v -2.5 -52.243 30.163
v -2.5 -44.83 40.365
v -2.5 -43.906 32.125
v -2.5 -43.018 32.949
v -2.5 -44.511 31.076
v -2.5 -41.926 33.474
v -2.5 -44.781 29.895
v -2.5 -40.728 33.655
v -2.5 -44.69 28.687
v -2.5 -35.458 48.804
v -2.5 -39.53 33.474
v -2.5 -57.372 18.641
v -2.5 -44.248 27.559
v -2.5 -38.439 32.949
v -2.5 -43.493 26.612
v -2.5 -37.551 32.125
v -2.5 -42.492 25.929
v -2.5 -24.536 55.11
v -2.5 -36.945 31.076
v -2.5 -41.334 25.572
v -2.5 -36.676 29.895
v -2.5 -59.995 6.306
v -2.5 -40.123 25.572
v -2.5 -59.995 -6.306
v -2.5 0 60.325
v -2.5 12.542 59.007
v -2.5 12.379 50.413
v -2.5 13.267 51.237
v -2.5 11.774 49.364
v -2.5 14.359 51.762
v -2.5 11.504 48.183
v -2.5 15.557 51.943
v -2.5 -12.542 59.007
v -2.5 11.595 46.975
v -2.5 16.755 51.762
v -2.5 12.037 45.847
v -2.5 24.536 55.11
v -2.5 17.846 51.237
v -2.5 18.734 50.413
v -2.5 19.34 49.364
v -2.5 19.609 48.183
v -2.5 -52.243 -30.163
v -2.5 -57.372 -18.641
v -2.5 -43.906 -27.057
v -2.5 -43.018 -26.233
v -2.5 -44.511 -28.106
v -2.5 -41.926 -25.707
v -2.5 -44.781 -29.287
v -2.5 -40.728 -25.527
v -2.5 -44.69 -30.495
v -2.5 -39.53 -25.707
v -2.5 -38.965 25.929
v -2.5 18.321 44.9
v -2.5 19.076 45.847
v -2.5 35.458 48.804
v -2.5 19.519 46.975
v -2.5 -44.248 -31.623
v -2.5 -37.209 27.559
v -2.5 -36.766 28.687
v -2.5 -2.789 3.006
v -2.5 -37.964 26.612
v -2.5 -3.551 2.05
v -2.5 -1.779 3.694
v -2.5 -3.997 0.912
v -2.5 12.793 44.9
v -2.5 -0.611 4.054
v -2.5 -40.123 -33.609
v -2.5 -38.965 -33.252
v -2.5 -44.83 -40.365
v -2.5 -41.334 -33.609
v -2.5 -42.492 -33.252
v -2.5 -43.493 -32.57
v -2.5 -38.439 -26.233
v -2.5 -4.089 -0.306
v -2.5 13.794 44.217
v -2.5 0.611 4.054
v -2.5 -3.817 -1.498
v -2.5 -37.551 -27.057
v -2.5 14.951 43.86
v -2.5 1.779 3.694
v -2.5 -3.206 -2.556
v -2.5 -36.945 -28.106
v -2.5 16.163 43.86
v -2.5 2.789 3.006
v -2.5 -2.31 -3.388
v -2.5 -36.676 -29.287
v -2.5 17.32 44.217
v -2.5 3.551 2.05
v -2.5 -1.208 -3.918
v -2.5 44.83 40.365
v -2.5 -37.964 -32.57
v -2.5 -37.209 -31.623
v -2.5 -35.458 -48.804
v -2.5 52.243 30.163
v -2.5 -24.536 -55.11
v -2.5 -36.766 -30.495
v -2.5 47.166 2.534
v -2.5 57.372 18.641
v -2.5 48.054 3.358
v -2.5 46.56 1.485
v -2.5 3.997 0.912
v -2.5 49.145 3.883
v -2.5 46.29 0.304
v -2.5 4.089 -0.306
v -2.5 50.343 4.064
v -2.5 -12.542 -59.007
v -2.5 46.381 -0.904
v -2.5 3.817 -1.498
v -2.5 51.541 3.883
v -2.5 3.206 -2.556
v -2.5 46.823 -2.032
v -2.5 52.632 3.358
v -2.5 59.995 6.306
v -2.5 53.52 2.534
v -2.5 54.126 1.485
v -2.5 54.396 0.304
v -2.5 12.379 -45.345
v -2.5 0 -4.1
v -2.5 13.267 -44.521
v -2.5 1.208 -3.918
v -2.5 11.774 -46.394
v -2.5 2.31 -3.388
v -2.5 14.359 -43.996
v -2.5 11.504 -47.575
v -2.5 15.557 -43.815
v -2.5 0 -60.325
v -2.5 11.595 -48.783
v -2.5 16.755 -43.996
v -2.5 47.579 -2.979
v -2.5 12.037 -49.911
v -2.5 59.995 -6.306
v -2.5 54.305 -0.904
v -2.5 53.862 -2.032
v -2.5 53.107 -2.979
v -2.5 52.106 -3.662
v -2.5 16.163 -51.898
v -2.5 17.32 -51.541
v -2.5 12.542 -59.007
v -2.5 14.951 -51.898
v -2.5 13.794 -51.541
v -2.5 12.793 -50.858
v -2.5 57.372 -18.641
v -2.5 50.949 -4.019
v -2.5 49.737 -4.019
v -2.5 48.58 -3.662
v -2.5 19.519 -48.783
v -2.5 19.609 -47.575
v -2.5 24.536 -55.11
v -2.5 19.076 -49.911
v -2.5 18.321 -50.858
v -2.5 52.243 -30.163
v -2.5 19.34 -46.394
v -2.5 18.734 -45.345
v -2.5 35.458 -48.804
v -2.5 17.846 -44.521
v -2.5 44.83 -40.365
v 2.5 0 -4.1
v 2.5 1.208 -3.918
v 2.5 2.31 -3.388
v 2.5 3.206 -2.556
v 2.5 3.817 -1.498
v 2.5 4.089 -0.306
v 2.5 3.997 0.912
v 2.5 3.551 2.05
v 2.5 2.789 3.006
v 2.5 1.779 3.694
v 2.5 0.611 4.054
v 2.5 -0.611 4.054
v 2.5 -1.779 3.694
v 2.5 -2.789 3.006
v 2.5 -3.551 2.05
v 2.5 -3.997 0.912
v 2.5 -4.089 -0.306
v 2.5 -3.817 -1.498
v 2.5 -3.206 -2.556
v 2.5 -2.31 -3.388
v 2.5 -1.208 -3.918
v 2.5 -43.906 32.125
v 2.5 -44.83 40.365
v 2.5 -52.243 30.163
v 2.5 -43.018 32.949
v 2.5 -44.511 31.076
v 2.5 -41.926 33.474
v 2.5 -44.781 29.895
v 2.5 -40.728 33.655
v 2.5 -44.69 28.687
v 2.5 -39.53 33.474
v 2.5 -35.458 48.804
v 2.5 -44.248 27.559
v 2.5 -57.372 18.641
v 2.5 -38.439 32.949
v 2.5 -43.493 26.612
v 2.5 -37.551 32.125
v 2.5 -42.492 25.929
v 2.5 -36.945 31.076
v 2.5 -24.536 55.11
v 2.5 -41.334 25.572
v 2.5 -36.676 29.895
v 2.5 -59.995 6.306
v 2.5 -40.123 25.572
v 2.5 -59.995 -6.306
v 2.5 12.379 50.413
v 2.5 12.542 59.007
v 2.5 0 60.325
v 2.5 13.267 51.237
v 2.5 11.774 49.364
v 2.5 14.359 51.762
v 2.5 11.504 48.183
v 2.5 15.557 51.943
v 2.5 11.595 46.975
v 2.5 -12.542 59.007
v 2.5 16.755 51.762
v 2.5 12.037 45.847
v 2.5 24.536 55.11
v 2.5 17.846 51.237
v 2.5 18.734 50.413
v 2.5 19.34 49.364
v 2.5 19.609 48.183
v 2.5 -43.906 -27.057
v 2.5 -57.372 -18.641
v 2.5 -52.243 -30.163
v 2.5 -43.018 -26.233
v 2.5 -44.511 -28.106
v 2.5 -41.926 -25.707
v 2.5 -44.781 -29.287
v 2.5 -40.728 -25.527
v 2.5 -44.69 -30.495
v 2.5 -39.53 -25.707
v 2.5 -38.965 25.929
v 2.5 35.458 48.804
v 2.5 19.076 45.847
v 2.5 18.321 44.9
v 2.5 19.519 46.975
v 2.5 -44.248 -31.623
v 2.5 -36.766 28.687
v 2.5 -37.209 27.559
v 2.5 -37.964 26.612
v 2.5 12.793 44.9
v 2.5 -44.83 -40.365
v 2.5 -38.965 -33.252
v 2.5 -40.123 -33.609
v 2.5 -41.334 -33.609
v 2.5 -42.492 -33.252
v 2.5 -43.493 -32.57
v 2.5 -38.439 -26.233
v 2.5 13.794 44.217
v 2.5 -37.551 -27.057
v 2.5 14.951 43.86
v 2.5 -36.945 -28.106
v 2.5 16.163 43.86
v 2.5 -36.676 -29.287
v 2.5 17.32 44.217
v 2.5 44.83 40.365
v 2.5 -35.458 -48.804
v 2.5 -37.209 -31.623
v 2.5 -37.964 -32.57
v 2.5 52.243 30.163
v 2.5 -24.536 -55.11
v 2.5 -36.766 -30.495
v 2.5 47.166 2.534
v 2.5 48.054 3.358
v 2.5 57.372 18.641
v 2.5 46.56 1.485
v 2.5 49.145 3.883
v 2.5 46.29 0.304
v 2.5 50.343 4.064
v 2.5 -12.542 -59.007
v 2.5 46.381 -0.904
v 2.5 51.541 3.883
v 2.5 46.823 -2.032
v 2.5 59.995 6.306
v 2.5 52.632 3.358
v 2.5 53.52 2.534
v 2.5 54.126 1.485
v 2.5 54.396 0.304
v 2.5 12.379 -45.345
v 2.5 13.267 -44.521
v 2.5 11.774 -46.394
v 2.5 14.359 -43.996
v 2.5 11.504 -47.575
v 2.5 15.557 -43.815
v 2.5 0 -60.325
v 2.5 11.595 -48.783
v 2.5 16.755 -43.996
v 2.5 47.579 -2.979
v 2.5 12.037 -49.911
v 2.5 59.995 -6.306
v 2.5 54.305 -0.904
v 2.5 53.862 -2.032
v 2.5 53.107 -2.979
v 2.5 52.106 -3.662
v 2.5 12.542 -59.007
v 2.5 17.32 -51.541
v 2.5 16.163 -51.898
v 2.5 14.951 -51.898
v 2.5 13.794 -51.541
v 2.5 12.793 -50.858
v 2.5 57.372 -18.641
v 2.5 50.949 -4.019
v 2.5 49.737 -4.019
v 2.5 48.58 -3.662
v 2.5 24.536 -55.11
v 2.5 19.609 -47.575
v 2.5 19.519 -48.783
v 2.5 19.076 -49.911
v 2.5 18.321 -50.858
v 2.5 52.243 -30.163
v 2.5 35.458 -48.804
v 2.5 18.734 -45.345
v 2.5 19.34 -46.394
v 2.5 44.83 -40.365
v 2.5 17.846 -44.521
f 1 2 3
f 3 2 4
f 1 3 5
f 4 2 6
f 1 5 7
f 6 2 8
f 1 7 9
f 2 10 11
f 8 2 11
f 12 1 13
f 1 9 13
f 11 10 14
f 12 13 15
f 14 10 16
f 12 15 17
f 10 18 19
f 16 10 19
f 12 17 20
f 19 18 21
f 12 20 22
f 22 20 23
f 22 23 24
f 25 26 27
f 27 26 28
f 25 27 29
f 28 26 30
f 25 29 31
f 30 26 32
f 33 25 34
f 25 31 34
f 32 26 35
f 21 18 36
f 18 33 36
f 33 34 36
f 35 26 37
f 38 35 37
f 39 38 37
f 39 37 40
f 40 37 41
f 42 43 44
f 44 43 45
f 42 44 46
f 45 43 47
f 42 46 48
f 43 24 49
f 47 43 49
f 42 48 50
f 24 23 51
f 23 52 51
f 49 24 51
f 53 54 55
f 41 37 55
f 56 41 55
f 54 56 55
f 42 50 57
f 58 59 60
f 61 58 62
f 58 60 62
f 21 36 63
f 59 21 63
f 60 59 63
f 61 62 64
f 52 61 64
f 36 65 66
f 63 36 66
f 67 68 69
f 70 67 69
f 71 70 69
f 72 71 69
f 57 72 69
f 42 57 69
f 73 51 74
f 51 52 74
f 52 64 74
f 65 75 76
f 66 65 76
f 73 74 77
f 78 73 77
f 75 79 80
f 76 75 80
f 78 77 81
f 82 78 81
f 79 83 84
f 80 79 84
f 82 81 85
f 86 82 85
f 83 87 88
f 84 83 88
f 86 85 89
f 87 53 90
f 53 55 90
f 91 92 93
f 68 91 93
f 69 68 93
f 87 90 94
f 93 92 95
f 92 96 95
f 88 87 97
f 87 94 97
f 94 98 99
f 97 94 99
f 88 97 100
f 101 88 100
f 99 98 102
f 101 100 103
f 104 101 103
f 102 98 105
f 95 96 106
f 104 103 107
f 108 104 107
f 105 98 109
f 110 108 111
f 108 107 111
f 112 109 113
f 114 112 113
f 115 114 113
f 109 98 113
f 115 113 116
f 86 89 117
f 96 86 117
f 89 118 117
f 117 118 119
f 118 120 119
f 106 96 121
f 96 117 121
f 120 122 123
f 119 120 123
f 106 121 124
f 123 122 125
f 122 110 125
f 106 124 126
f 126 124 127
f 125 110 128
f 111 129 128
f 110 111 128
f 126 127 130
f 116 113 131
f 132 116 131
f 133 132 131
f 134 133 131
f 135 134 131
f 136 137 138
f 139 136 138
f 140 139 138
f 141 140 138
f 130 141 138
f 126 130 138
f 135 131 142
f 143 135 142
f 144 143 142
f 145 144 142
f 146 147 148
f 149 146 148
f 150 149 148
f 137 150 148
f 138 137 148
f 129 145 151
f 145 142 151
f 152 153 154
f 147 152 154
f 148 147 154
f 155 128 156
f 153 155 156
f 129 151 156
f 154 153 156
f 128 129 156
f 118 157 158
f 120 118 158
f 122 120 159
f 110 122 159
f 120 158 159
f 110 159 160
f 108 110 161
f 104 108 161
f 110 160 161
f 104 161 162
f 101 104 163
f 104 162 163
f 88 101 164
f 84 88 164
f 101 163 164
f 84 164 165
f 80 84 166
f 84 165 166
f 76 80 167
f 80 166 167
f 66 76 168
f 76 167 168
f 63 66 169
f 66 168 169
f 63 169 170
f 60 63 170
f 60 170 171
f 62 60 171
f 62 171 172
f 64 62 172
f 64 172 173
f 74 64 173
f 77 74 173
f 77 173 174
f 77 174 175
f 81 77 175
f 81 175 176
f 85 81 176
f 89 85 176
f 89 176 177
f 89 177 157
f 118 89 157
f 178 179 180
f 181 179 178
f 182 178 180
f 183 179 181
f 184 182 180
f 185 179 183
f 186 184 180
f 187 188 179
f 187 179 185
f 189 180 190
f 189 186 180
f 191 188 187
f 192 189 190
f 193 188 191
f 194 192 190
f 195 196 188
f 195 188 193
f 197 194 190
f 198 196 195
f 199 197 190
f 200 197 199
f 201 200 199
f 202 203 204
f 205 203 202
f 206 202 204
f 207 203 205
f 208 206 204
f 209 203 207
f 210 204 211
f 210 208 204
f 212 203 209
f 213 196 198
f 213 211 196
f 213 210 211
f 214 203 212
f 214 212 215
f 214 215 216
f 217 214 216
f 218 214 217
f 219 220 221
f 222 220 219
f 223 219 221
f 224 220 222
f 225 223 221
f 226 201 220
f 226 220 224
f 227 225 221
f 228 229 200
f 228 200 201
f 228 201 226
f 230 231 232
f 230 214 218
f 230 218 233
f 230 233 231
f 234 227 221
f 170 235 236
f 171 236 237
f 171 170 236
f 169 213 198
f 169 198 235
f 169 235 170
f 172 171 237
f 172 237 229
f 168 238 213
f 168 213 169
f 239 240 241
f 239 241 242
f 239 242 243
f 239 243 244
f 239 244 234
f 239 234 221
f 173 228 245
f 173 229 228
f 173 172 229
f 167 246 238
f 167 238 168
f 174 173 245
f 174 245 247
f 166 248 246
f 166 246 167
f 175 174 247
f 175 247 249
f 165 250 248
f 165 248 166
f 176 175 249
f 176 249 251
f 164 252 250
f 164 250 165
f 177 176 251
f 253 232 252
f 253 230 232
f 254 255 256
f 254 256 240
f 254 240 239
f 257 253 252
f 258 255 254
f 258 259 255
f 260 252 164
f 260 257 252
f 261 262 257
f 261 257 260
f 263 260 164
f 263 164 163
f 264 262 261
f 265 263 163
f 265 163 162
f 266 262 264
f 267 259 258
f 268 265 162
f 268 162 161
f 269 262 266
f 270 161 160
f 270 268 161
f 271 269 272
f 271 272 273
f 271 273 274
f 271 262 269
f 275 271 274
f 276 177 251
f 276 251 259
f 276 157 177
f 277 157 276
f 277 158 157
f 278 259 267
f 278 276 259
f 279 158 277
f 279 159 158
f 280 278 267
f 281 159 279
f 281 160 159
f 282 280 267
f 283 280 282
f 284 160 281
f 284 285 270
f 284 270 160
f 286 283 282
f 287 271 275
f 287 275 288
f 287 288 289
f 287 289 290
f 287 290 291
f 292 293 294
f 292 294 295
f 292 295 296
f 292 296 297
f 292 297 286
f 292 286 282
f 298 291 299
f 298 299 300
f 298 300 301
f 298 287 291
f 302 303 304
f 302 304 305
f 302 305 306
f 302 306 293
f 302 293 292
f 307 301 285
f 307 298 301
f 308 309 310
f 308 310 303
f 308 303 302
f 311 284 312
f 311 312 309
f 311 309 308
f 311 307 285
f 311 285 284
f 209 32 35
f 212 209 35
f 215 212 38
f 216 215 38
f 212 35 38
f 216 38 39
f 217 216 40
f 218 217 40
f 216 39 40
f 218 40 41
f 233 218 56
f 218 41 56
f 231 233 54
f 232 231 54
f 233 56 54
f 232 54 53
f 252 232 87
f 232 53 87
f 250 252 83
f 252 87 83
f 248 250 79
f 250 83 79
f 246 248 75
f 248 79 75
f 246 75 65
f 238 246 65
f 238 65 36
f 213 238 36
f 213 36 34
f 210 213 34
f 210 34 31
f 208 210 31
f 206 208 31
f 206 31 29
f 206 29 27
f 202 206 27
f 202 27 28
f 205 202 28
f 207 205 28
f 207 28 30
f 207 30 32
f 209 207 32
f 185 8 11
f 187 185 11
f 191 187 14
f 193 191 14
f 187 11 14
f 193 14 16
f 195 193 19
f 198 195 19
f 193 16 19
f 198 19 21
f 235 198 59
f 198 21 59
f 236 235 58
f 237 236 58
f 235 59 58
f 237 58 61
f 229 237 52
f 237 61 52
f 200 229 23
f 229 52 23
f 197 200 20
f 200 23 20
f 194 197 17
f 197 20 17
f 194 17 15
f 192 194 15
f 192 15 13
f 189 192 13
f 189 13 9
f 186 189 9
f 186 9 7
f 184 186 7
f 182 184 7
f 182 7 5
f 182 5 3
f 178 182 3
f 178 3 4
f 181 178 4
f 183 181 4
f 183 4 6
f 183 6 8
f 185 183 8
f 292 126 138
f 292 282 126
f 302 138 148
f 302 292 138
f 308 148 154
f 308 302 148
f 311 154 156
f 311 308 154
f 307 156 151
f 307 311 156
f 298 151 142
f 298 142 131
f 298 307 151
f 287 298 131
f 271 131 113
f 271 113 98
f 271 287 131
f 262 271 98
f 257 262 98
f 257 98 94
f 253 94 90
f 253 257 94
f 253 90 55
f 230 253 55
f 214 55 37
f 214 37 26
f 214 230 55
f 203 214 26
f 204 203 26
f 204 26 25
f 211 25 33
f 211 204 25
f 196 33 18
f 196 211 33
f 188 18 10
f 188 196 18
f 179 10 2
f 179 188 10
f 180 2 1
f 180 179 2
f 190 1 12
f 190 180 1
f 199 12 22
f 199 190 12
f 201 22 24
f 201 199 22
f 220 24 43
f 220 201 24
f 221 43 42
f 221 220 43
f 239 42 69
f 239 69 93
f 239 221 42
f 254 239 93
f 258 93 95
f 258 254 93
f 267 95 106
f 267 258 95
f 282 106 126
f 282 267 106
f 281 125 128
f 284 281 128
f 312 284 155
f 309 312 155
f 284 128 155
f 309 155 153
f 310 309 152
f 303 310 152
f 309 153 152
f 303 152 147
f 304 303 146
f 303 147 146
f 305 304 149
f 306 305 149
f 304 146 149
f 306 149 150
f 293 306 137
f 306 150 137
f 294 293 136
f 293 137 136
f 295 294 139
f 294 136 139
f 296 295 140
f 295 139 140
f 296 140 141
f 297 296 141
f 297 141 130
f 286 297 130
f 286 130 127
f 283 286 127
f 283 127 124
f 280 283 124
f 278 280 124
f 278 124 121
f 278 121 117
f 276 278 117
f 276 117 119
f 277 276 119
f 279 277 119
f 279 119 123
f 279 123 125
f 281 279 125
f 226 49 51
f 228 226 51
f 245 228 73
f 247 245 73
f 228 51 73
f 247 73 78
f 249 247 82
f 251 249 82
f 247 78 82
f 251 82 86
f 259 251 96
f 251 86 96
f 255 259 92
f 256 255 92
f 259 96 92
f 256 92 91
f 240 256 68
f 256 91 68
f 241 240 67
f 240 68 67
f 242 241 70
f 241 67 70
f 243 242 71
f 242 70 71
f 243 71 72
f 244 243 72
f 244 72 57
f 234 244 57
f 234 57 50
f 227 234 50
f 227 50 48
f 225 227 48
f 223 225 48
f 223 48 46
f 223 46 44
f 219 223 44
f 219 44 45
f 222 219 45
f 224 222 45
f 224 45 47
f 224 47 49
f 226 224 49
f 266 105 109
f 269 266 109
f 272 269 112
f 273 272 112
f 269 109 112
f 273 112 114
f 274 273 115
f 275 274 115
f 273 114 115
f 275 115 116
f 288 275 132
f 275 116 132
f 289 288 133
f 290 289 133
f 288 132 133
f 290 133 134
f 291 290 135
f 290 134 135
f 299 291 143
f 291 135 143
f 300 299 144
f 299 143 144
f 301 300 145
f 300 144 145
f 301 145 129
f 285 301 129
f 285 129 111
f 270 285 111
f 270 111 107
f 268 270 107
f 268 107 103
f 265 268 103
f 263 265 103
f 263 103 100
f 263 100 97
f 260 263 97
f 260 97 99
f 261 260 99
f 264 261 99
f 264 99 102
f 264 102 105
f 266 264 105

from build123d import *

# Parameters (mm, degrees)
SKETCH1_R           = 60.325
BOSS_EXTRUDE1_DEPTH = 2.5
SKETCH2_R           = 4.064
CUT_EXTRUDE1_DEPTH  = 86.458827806
SKETCH8_R           = 4.1
CUT_EXTRUDE4_DEPTH  = 86.458827806


with BuildPart() as part:
    # Sketch1 → Boss-Extrude1 (new, symmetric)
    with BuildSketch(Plane(origin=(0, 0, 0), x_dir=(0, 0, -1), z_dir=(1, 0, 0))):
        Circle(SKETCH1_R)
    extrude(amount=BOSS_EXTRUDE1_DEPTH, both=True)

    # Sketch2 → Cut-Extrude1 (cut, through all)
    with BuildSketch(Plane.ZY.offset(2.5)):
        with Locations((0, 50.342959834)):
            Circle(SKETCH2_R)
        with Locations((47.879, 15.556830136)):
            Circle(SKETCH2_R)
        with Locations((29.590849347, -40.728310053)):
            Circle(SKETCH2_R)
        with Locations((-29.590849347, -40.728310053)):
            Circle(SKETCH2_R)
        with Locations((-47.879, 15.556830136)):
            Circle(SKETCH2_R)
    extrude(amount=-CUT_EXTRUDE1_DEPTH, mode=Mode.SUBTRACT)

    # Sketch8 → Cut-Extrude4 (cut, through all)
    with BuildSketch(Plane(origin=(2.5, 0, 0), x_dir=(0, 0, -1), z_dir=(1, 0, 0))):
        Circle(SKETCH8_R)
    extrude(amount=-CUT_EXTRUDE4_DEPTH, mode=Mode.SUBTRACT)


solid = part.part
